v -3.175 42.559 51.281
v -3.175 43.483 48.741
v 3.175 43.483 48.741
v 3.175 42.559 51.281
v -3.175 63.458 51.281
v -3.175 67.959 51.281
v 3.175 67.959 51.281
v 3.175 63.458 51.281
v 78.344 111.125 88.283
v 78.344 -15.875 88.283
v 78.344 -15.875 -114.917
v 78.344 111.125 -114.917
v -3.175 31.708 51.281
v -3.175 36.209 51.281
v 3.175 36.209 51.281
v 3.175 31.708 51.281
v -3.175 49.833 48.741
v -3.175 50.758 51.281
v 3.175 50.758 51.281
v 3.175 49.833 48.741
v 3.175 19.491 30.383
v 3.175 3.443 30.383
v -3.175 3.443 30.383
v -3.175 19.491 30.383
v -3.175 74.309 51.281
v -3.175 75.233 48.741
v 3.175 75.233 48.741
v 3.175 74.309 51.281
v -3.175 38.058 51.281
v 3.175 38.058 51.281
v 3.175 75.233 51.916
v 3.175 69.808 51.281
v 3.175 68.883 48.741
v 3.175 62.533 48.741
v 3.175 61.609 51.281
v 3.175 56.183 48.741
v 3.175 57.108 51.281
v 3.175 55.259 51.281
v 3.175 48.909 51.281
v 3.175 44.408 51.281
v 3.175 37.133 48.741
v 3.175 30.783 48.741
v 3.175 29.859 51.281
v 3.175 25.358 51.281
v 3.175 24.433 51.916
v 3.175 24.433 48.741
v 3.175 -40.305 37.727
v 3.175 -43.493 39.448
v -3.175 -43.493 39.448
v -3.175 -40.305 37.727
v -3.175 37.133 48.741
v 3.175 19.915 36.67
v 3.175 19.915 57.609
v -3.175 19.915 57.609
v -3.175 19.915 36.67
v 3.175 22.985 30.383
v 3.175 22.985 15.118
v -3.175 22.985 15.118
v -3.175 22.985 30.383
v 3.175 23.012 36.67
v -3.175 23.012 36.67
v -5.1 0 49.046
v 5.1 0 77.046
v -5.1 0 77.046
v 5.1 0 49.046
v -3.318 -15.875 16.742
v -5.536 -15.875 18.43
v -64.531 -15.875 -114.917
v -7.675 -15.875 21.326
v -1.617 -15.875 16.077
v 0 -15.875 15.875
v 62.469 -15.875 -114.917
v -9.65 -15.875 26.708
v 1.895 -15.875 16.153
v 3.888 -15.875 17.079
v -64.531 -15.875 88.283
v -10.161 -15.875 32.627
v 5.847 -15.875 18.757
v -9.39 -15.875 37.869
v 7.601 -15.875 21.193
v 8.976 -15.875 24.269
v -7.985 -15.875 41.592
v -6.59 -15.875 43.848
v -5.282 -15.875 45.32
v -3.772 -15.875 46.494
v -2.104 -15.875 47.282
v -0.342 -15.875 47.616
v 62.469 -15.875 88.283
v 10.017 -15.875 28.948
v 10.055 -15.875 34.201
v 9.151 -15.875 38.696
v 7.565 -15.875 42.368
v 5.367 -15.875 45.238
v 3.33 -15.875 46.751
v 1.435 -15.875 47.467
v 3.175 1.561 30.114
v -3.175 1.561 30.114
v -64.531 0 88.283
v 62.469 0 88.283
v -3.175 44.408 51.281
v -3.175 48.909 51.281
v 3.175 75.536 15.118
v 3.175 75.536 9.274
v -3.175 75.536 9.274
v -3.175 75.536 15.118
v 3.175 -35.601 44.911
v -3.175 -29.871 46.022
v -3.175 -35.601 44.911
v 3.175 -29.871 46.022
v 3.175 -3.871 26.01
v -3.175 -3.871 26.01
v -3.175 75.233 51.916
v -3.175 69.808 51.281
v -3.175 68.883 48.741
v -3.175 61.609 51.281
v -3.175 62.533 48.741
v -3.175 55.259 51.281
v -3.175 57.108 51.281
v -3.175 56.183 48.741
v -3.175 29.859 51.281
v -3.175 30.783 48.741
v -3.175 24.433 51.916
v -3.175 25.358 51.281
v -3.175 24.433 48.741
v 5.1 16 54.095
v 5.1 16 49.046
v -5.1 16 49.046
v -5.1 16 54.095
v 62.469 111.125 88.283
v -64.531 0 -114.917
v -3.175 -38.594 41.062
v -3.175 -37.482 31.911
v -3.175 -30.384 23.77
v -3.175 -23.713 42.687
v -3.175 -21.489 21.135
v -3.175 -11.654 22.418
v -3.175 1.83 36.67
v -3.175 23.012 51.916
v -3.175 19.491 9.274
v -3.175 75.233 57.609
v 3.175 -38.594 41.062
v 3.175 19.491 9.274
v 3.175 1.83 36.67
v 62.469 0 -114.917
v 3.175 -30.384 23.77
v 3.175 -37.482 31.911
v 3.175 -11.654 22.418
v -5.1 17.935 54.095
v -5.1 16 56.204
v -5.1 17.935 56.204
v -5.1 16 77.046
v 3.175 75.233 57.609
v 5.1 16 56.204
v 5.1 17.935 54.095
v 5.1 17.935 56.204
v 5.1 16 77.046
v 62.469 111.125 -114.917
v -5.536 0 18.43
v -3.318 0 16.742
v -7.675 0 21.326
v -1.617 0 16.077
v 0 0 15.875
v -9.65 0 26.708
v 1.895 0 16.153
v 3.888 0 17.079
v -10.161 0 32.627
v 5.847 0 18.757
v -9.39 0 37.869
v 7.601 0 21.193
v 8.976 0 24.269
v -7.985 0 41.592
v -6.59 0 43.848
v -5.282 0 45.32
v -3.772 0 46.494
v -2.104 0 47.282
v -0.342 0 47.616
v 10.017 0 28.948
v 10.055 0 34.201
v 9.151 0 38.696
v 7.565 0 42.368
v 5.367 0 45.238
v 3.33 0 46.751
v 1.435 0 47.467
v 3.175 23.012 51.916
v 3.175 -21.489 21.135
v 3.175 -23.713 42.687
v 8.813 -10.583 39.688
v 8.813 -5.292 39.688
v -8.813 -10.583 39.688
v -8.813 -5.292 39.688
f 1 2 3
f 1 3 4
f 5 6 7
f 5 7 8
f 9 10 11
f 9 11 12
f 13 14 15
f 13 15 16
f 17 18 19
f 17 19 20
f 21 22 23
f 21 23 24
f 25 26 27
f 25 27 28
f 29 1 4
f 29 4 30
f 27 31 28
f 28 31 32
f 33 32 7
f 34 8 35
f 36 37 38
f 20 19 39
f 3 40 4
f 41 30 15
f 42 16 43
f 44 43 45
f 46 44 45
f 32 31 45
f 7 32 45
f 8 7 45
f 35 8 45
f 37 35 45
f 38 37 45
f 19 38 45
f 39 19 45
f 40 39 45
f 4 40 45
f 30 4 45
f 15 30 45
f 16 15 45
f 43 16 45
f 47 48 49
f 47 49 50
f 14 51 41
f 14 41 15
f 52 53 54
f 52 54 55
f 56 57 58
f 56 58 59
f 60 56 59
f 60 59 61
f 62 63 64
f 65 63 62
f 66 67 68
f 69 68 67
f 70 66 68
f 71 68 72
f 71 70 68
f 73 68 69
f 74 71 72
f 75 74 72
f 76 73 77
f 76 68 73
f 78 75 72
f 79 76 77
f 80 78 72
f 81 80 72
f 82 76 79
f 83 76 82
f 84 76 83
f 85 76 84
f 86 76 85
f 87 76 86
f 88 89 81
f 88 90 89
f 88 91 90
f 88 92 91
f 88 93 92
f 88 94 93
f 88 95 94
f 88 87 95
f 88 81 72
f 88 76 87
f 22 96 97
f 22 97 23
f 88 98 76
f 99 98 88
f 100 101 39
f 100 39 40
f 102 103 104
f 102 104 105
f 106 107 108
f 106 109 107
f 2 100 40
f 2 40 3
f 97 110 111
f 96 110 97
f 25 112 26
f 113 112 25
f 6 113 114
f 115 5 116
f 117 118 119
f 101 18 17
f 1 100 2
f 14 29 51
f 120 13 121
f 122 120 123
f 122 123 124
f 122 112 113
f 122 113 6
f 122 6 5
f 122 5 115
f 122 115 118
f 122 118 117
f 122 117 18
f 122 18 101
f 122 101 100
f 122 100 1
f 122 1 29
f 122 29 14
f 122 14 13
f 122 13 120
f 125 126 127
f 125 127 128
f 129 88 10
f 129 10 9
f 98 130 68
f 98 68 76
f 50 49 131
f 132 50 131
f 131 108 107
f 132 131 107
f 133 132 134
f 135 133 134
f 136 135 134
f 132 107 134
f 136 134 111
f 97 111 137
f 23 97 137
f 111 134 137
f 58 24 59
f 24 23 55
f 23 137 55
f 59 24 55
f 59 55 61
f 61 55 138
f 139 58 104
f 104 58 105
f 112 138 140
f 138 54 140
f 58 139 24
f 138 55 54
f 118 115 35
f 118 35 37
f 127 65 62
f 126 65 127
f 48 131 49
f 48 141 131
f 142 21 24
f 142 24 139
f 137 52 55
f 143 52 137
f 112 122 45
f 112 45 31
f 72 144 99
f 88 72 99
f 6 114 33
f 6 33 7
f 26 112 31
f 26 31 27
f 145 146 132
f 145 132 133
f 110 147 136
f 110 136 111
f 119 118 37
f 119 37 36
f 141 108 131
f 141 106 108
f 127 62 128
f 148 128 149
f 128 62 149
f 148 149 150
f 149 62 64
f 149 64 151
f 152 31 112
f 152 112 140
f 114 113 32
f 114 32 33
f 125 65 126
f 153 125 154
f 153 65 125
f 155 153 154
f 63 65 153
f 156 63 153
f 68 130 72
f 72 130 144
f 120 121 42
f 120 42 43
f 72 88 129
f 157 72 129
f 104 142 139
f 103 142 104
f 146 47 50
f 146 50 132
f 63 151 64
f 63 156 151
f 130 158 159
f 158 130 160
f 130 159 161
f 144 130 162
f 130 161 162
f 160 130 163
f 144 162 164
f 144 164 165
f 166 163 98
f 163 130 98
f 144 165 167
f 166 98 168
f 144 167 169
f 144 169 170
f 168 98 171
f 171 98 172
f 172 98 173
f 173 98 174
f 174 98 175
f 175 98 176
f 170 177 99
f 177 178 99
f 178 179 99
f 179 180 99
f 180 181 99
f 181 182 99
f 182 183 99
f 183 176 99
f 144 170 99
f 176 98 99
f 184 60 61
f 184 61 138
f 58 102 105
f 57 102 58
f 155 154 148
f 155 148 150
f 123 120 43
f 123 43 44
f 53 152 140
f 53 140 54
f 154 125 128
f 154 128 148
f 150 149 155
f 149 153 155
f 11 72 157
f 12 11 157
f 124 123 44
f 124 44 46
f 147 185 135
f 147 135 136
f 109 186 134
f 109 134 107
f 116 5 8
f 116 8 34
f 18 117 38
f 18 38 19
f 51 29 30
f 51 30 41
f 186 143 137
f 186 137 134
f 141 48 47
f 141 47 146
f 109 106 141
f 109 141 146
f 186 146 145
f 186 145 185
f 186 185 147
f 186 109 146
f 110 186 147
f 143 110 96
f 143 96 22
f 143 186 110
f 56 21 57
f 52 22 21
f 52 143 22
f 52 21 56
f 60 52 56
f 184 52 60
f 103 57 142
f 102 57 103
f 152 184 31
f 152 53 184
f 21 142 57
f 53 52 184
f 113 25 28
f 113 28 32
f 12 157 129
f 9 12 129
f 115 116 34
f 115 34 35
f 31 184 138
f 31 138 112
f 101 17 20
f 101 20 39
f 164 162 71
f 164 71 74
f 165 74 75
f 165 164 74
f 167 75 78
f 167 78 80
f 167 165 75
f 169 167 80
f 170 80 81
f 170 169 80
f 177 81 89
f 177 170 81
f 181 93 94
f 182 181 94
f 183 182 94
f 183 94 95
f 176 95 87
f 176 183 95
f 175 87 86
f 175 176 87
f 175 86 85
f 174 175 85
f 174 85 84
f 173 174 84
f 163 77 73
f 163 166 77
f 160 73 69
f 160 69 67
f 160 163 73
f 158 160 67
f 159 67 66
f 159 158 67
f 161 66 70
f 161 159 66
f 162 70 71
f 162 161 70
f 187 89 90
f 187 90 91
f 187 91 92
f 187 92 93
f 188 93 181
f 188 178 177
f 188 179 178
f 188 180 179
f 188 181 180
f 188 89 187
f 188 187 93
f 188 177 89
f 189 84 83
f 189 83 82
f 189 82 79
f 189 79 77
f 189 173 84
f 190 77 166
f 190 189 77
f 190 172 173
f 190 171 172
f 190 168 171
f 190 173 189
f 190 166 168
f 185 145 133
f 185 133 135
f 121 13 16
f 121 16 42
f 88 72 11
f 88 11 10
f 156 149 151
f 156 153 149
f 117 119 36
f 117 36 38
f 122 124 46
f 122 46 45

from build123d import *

# Parameters (mm, degrees)
F2_DEPTH      = 3.175
F2_DEPTH_BACK = 3.175
F3_W          = 127
F3_H          = 203.2
F4_DEPTH      = 15.875
F5_W          = 127
F5_H          = 203.2
F6_DEPTH      = 15.875
F7_W          = 1.9345794022
F7_H          = 2.1087378263
F8_DEPTH      = 5.1
F8_DEPTH_BACK = 5.1
F10_DEPTH     = 6.35


# Not quite as in the source:
# - a variable given as a bare number and used for a length is read in inches; the dataset says mm whatever the document's units were


with BuildPart() as f2:
    # F1 (on Right) → F2 (new body, two sides)
    with BuildSketch(Plane.YZ) as f2_sk:
        Polygon((-38.594293431, 41.0619944761), (-43.4932071195, 39.4476822198), (-40.3047855642, 37.7265355505), (-37.482474095, 31.9108637659), (-30.3839322929, 23.7697052669), (-21.4893757698, 21.1347664927), (-11.6540487569, 22.4176353632), (-3.8713104227, 26.0096677876), (1.5612775253, 30.1139711279), (3.4430737253, 30.3825888026), (19.4908740901, 30.3825888026), (19.4908740901, 9.2737668518), (75.5363102326, 9.2737668518), (75.5363102326, 15.1181869977), (22.9848847986, 15.1181869977), (22.9848847986, 30.3825888026), (23.0121565767, 36.6700449444), (23.0121565767, 51.9156488357), (75.233297396, 51.9156488357), (75.233297396, 57.6085964854), (19.9154892202, 57.6085964854), (19.9154892202, 36.6700449444), (1.8303633194, 36.6700449444), (-23.7130144418, 42.6869621861), (-29.8707857541, 46.0224201941), (-35.6009331156, 44.9106008581), align=None)
    extrude(amount=F2_DEPTH)
    extrude(f2_sk.sketch, amount=-F2_DEPTH_BACK)


with BuildPart() as f4:
    # F3 (on Front) → F4 (new body)
    with BuildSketch(Plane.XZ):
        with Locations((-1.0310392827, -13.3170386252)):
            Rectangle(F3_W, F3_H)
        with BuildLine():
            add(Edge.make_bspline(
                [(0, 15.875), (17.626948032, 15.875), (8.813474016, 39.6875), (0, 63.5), (-8.813474016, 39.6875), (-17.626948032, 15.875), (0, 15.875)],
                knots=[0, 0, 0, 2.0943951024, 2.0943951024, 4.1887902048, 4.1887902048, 6.2831853072, 6.2831853072, 6.2831853072], degree=2, weights=[1, 0.5, 1, 0.5, 1, 0.5, 1]))
        make_face(mode=Mode.SUBTRACT)
    extrude(amount=F4_DEPTH)


with BuildPart() as f6:
    # F5 (on face) → F6 (new body)
    with BuildSketch(Plane.YZ.offset(62.4689607173)):
        with Locations((47.625, -13.3170386252)):
            Rectangle(F5_W, F5_H)
    extrude(amount=F6_DEPTH)


with BuildPart() as f8:
    # F7 (on Right) → F8 (new body, two sides)
    with BuildSketch(Plane.YZ) as f8_sk:
        Polygon((16, 56.2037155032), (16, 77.0455870458), (0, 77.0455870458), (0, 49.0455870458), (16, 49.0455870458), (16, 54.0949776769), align=None)
        with Locations((16.9672897011, 55.14934659)):
            Rectangle(F7_W, F7_H)
    extrude(amount=F8_DEPTH)
    extrude(f8_sk.sketch, amount=-F8_DEPTH_BACK)


with BuildPart() as f10:
    # F9 (on face) → F10 (new body)
    with BuildSketch(Plane(origin=(-3.175, 0, 0), x_dir=(0, -1, 0), z_dir=(-1, 0, 0))):
        Polygon((-68.883297396, 51.9156488357), (-75.233297396, 51.9156488357), (-75.233297396, 51.2806488357), (-75.233297396, 48.7406488357), (-74.308813001, 51.2806488357), (-69.807781791, 51.2806488357), (-68.883297396, 48.7406488357), (-68.883297396, 51.2806488357), align=None)
        Polygon((-62.533297396, 51.9156488357), (-68.883297396, 51.9156488357), (-68.883297396, 51.2806488357), (-68.883297396, 48.7406488357), (-67.958813001, 51.2806488357), (-63.457781791, 51.2806488357), (-62.533297396, 48.7406488357), (-62.533297396, 51.2806488357), align=None)
        Polygon((-56.183297396, 51.9156488357), (-62.533297396, 51.9156488357), (-62.533297396, 51.2806488357), (-62.533297396, 48.7406488357), (-61.608813001, 51.2806488357), (-57.107781791, 51.2806488357), (-56.183297396, 48.7406488357), (-56.183297396, 51.2806488357), align=None)
        Polygon((-49.833297396, 51.9156488357), (-56.183297396, 51.9156488357), (-56.183297396, 51.2806488357), (-56.183297396, 48.7406488357), (-55.258813001, 51.2806488357), (-50.757781791, 51.2806488357), (-49.833297396, 48.7406488357), (-49.833297396, 51.2806488357), align=None)
        Polygon((-43.483297396, 51.9156488357), (-49.833297396, 51.9156488357), (-49.833297396, 51.2806488357), (-49.833297396, 48.7406488357), (-48.908813001, 51.2806488357), (-44.407781791, 51.2806488357), (-43.483297396, 48.7406488357), (-43.483297396, 51.2806488357), align=None)
        Polygon((-37.133297396, 51.9156488357), (-43.483297396, 51.9156488357), (-43.483297396, 51.2806488357), (-43.483297396, 48.7406488357), (-42.558813001, 51.2806488357), (-38.057781791, 51.2806488357), (-37.133297396, 48.7406488357), (-37.133297396, 51.2806488357), align=None)
        Polygon((-30.783297396, 51.9156488357), (-37.133297396, 51.9156488357), (-37.133297396, 51.2806488357), (-37.133297396, 48.7406488357), (-36.208813001, 51.2806488357), (-31.707781791, 51.2806488357), (-30.783297396, 48.7406488357), (-30.783297396, 51.2806488357), align=None)
        Polygon((-24.433297396, 51.9156488357), (-30.783297396, 51.9156488357), (-30.783297396, 51.2806488357), (-30.783297396, 48.7406488357), (-29.858813001, 51.2806488357), (-25.357781791, 51.2806488357), (-24.433297396, 48.7406488357), (-24.433297396, 51.2806488357), align=None)
    extrude(amount=-F10_DEPTH)


solid = Compound([f2.part, f4.part, f6.part, f8.part, f10.part])
